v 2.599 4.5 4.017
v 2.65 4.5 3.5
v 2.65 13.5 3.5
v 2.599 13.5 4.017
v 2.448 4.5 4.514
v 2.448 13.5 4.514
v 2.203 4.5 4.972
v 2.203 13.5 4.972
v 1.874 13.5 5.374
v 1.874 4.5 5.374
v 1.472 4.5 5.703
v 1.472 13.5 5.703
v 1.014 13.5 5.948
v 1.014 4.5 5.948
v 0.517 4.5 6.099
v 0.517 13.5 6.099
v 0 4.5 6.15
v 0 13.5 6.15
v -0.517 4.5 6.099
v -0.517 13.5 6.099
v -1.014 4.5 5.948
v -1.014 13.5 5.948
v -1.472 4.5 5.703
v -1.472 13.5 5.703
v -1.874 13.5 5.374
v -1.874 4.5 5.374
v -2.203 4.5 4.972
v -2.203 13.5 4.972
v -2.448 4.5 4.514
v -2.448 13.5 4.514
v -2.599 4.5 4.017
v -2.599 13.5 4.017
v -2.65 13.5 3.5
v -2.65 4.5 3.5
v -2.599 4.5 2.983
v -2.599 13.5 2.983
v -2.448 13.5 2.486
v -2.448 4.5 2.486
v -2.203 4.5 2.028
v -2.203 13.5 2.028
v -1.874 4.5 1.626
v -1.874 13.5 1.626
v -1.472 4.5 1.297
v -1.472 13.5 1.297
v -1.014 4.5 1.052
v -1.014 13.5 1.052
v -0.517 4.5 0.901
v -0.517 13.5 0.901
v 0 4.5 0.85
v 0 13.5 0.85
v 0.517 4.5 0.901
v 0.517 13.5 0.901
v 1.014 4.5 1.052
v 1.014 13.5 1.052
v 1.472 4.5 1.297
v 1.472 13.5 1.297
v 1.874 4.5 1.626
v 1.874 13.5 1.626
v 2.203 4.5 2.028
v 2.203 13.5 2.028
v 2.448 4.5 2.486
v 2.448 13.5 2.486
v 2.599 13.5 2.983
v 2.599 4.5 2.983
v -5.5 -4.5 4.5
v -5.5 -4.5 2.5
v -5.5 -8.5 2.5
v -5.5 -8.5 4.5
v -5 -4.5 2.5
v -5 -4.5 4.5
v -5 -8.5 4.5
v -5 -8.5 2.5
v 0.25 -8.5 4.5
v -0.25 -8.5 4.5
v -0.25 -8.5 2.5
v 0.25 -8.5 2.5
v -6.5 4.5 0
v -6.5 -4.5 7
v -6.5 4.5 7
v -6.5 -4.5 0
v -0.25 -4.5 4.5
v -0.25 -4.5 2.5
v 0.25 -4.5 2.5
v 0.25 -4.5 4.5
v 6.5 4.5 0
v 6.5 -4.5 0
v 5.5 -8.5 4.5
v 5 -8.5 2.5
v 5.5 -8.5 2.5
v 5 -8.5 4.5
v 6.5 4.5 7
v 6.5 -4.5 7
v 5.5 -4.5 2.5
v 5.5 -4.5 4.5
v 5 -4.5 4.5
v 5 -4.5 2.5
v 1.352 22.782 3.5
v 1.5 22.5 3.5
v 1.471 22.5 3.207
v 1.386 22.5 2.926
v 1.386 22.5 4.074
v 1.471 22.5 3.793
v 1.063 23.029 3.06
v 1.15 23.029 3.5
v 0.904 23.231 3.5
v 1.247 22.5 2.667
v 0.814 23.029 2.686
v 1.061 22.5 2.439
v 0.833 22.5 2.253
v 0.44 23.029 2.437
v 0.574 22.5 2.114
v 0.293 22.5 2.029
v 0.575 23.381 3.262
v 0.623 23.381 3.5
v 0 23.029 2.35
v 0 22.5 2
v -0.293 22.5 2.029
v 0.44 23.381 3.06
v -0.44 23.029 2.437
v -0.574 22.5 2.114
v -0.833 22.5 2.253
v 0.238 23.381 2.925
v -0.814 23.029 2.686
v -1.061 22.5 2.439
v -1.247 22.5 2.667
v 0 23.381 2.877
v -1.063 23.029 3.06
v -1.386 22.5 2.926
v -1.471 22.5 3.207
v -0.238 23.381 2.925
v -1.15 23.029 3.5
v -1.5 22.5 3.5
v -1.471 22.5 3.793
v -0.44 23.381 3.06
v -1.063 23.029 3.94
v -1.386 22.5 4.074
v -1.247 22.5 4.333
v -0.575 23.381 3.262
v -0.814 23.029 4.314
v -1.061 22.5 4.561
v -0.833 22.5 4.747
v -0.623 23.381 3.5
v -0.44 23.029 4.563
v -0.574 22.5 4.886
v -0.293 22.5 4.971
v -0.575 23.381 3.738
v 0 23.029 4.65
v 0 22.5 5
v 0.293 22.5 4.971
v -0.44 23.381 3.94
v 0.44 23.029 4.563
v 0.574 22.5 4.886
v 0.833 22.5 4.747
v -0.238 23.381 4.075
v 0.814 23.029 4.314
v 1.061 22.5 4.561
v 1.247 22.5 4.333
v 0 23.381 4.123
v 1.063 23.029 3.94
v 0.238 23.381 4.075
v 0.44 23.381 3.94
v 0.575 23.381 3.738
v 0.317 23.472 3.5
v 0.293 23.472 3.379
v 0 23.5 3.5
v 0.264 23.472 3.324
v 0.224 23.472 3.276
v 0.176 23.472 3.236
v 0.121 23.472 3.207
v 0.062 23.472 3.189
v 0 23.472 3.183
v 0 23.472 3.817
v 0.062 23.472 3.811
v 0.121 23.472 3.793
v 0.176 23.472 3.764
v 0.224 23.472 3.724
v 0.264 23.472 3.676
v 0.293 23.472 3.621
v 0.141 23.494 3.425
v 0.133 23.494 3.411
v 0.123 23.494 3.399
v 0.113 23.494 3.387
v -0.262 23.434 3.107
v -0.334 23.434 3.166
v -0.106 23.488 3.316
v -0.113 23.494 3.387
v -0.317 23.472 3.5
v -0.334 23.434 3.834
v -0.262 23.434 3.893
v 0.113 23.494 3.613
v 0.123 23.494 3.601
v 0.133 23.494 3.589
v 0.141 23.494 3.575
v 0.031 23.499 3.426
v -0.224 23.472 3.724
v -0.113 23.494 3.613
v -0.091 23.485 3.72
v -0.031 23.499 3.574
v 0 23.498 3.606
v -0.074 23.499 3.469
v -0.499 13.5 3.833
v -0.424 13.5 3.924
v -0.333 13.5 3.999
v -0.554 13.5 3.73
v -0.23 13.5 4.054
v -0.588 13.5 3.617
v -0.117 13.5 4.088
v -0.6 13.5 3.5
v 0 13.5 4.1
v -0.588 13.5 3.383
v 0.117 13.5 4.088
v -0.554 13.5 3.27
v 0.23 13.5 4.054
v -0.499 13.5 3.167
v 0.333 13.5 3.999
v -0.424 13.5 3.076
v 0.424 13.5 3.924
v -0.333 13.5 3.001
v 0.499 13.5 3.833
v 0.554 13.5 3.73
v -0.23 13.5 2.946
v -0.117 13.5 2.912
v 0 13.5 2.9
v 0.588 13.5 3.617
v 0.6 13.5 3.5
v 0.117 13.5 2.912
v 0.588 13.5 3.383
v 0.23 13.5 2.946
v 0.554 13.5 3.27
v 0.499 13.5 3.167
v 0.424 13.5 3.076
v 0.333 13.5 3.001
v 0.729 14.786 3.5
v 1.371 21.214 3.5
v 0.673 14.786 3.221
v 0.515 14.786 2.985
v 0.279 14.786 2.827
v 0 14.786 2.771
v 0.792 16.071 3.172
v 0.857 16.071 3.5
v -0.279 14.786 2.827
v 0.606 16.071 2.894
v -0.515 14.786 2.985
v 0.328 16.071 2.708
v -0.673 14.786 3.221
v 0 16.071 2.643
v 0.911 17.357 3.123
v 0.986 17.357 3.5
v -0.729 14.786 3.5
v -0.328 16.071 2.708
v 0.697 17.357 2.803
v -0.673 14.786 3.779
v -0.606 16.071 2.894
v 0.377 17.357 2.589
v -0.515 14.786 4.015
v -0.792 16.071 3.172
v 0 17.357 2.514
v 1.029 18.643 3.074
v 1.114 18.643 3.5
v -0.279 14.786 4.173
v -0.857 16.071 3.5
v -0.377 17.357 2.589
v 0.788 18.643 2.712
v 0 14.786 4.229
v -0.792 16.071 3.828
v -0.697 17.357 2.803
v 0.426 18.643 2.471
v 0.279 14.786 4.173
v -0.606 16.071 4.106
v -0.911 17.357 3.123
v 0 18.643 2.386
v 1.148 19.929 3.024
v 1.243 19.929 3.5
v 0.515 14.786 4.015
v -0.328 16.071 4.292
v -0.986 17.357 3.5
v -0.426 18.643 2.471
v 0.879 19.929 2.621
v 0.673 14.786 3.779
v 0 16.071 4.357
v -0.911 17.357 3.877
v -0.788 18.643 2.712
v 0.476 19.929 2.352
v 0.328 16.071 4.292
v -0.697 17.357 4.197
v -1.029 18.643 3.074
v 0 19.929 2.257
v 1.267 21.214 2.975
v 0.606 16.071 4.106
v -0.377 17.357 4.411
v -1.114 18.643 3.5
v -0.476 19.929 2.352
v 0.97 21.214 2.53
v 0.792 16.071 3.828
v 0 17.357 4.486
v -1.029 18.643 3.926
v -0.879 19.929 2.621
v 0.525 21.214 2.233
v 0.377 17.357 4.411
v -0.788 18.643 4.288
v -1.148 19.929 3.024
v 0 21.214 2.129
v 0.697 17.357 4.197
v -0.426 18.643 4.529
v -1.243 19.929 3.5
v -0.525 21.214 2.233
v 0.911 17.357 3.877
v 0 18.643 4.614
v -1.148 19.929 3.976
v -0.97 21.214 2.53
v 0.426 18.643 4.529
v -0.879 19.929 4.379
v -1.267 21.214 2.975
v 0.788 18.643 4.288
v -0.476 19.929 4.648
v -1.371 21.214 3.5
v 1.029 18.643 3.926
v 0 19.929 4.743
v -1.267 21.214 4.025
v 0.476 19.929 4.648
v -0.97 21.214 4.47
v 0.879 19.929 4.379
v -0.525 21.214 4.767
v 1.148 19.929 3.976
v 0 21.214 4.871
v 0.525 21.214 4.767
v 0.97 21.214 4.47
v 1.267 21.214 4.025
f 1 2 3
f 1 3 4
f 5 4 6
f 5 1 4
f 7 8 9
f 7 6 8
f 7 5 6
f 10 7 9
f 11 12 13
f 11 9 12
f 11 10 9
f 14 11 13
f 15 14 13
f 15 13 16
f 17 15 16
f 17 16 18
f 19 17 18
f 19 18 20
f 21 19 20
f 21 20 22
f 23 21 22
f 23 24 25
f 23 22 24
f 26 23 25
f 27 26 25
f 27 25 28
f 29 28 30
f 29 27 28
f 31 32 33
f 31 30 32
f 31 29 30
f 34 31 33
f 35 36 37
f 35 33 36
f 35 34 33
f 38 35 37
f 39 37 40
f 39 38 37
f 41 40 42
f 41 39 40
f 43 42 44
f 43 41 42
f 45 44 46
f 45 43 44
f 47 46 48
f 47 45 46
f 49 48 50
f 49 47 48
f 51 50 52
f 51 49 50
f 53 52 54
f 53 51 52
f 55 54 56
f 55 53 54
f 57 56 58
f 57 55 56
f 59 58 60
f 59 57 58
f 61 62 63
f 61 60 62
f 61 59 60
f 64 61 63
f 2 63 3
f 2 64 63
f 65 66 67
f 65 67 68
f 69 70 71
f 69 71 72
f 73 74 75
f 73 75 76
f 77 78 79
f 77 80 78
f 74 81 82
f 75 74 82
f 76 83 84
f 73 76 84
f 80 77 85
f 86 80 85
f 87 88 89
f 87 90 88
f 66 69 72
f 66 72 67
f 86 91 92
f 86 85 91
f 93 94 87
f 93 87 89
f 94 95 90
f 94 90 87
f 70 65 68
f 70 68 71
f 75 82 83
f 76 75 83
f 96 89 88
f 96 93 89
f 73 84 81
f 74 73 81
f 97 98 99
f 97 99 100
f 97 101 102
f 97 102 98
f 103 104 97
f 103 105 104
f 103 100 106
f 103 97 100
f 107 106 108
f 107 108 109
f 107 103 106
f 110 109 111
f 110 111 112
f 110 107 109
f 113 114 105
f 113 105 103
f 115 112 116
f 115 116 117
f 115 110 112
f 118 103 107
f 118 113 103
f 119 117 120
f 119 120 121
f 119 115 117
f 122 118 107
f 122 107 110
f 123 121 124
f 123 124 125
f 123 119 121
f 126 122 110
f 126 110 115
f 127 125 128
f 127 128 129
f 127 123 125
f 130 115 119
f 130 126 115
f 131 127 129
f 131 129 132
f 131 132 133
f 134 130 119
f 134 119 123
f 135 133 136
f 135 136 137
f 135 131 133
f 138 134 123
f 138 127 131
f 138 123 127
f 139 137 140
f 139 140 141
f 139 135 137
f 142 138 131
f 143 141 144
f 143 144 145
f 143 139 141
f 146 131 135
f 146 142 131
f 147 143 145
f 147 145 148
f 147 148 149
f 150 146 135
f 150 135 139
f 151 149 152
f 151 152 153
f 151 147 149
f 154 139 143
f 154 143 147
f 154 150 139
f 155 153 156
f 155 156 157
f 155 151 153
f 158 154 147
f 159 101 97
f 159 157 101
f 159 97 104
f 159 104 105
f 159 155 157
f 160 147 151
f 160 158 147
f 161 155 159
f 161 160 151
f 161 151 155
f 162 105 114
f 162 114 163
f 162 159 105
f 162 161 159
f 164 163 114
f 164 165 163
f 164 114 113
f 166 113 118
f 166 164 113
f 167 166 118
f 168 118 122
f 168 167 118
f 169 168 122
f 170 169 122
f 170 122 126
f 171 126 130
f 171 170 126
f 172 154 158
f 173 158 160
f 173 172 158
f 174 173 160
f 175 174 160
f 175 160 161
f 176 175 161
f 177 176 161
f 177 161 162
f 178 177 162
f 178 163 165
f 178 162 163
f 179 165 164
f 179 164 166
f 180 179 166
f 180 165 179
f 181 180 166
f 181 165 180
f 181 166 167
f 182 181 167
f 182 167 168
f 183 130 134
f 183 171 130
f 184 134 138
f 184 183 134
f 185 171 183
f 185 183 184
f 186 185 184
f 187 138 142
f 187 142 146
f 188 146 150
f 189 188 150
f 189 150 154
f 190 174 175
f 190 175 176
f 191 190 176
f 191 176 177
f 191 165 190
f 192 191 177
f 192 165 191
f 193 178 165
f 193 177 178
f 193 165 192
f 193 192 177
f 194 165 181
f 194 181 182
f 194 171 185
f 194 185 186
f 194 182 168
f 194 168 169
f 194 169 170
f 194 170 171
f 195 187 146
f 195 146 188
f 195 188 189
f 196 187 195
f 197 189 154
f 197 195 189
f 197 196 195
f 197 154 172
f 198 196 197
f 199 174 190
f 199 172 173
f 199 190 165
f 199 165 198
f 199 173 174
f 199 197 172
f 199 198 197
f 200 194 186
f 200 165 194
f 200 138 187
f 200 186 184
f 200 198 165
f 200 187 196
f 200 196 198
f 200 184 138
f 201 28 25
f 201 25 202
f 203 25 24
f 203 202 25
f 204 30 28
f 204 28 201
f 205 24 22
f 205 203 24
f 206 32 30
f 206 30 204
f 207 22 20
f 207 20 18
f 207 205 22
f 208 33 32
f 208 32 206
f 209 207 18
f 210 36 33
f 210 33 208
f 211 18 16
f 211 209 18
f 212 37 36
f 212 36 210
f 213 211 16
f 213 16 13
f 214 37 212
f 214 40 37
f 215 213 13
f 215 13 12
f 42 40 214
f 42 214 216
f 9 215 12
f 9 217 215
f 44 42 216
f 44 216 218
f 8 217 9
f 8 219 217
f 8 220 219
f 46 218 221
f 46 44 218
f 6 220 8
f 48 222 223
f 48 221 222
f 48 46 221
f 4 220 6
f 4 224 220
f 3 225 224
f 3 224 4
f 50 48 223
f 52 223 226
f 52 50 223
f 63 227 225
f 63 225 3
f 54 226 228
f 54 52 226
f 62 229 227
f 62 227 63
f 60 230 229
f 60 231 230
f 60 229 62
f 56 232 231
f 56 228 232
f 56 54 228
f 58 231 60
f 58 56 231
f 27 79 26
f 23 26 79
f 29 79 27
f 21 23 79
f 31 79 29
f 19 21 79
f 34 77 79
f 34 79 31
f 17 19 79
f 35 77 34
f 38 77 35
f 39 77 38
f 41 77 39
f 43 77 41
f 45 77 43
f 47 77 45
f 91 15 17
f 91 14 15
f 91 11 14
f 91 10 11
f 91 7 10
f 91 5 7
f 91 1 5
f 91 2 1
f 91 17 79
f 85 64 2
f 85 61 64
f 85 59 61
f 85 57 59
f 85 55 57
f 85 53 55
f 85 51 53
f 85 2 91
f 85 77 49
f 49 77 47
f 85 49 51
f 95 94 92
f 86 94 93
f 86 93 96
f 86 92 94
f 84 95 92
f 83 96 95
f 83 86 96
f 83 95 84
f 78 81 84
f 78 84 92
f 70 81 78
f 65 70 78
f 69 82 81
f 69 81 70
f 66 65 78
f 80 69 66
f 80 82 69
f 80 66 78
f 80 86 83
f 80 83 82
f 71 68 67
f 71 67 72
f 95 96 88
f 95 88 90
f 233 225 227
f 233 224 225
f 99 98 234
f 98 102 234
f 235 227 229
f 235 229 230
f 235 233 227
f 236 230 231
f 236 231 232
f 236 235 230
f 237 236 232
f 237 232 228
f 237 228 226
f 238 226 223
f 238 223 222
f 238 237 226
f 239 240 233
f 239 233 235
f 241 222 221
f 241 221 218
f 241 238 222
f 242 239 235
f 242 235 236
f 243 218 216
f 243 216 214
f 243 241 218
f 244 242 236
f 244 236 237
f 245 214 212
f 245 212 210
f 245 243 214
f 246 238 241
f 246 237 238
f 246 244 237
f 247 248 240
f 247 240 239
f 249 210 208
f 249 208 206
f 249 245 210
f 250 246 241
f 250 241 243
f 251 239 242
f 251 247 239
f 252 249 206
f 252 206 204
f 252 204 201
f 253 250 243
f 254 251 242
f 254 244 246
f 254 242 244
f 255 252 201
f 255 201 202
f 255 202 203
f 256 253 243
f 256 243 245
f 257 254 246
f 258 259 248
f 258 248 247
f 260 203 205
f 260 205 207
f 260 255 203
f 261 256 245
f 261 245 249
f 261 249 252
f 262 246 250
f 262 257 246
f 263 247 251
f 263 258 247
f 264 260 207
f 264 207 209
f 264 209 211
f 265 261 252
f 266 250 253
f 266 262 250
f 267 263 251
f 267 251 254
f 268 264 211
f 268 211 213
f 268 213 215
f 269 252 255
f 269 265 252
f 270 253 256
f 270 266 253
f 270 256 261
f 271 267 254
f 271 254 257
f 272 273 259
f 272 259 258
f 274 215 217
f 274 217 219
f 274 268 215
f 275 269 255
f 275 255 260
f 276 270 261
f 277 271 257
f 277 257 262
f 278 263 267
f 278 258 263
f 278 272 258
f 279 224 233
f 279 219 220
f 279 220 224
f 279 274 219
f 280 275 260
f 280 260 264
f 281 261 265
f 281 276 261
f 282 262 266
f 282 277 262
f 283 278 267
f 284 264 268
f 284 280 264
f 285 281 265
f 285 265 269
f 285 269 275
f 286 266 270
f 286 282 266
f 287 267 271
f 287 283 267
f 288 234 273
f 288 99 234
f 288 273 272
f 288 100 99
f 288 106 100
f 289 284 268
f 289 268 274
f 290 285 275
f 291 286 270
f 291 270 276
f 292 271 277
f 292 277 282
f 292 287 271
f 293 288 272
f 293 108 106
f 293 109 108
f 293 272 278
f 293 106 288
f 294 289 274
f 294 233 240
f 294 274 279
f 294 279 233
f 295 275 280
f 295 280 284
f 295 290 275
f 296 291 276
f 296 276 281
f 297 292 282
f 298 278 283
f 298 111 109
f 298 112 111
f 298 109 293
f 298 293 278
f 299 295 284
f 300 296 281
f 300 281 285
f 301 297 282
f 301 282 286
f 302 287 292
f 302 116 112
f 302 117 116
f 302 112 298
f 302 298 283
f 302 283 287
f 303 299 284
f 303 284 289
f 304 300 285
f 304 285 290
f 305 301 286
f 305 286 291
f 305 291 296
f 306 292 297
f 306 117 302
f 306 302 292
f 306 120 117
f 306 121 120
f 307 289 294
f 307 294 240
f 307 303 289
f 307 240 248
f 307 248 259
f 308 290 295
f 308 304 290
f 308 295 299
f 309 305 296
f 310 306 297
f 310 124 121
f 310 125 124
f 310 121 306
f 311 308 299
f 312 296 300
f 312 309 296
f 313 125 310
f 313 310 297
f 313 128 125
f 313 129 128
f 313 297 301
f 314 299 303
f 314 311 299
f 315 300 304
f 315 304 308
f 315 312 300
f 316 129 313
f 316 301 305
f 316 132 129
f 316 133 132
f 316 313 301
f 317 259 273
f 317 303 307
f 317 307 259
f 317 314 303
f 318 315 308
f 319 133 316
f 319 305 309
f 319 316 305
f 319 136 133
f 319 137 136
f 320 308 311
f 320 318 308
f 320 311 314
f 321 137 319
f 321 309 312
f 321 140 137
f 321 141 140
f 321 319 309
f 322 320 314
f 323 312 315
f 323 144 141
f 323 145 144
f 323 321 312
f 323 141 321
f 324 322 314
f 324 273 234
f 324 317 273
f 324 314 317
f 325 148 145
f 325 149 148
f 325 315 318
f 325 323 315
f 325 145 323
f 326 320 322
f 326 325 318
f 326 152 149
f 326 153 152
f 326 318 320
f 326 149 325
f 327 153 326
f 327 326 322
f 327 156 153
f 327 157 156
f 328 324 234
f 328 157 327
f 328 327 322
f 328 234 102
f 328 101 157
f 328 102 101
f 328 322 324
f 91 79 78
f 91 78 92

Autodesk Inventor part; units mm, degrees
ref_plane "YZ Plane" through (0, 0, 0) normal (1, 0, 0) x (0, 1, 0)
ref_plane "XZ Plane" through (0, 0, 0) normal (0, 1, 0) x (-1, 0, 0)
ref_plane "XY Plane" through (0, 0, 0) normal (0, 0, 1) x (1, 0, 0)
sketch "Sketch1" plane through (0, 0, 0) normal (0, 0, 1) x (1, 0, 0)
  line L0 (-6.5, 4.5) -> (6.5, 4.5)
  line L1 (6.5, 4.5) -> (6.5, -4.5)
  line L2 (6.5, -4.5) -> (-6.5, -4.5)
  line L3 (-6.5, -4.5) -> (-6.5, 4.5)
  point P0 (0, 0)
  dimension "d0" = 13
  dimension "d1" = 9
  dimension "d2" = 4.5
  dimension "d3" = 6.5
extrude "Extrusion1" add sketch "Sketch1" along normal blind 7
sketch "Sketch2" plane through (-6.5, -4.5, 0) normal (0, -1, 0) x (1, 0, 0)
  line L0 (1, 4.5) -> (1.5, 4.5)
  line L1 (1.5, 4.5) -> (1.5, 2.5)
  line L2 (1.5, 2.5) -> (1, 2.5)
  line L3 (1, 2.5) -> (1, 4.5)
  line L4 (11.5, 4.5) -> (12, 4.5)
  line L5 (12, 4.5) -> (12, 2.5)
  line L6 (12, 2.5) -> (11.5, 2.5)
  line L7 (11.5, 2.5) -> (11.5, 4.5)
  line L8 (6.25, 2.5) -> (6.75, 2.5)
  line L9 (6.75, 2.5) -> (6.75, 4.5)
  line L10 (6.75, 4.5) -> (6.25, 4.5)
  line L11 (6.25, 4.5) -> (6.25, 2.5)
  line L12 (0, 0) -> (0, 7) projected
  line L13 (13, 0) -> (13, 7) projected
  line L14 (0, 7) -> (13, 7) projected
  point P0 (6.5, 0)
  dimension "d6" = 0.5
  dimension "d7" = 0.5
  dimension "d8" = 0.5
  dimension "d9" = 1
  dimension "d10" = 1
  dimension "d11" = 6.25
  dimension "d12" = 6.25
  dimension "d13" = 2
  dimension "d14" = 2
  dimension "d15" = 2
  dimension "d16" = 2.5
extrude "Extrusion2" add sketch "Sketch2" along normal blind 4
sketch "Sketch3" plane through (-6.5, 4.5, 0) normal (0, 1, 0) x (1, 0, 0)
  line L0 (0, -7) -> (13, -7) projected
  line L1 (0, 0) -> (0, -7) projected
  circle A0 centre (6.5, -3.5) radius 2.65
  point P0 (6.5, 0)
  point P1 (6.5, -7)
  point P2 (0, -3.5)
  dimension "d19" = 5.3
extrude "Extrusion3" add sketch "Sketch3" along normal blind 9
sketch "Sketch4" plane through (0, 13.5, 3.5) normal (0, 1, 0) x (1, 0, 0)
  line L0 (-0.5, 0) -> (0.5, 0)
  line L1 (0.5, 0) -> (0.5, 0.1)
  line L2 (0.5, 0.1) -> (-0.5, 0.1)
  line L3 (-0.5, 0.1) -> (-0.5, 0)
  circle A0 centre (0, 0) radius 2.65 projected
  point P0 (0, 3.5)
  dimension "d22" = 0
  dimension "d23" = 0.1
  dimension "d24" = 0.5
  dimension "d25" = 0.5
extrude "Extrusion4" add sketch "Sketch4" along normal blind 3 contours L3 L2 L1 L0
sketch "Sketch5" plane through (-0.5, 13.5, 3.5) normal (0, 0, 1) x (1, 0, 0)
  line L0 (3.15, 0) -> (-2.15, 0) projected
  line L1 (0, 0) -> (0, 3) projected
  line L2 (1.1, 0) -> (2, 9)
  arc A0 (2, 9) -> (0.5, 10) centre (0.5167, 8.4001) ccw
  line L3 (0.5, 10) -> (0.5, 0)
  line L4 (1.1, 0) -> (0.5, 0)
  line L5 (0.5, -28.4463) -> (0.5, 16.6776) projected
  point P0 (0.5, -13.5)
  point P1 (2, 10)
  dimension "d28" = 10
  dimension "d29" = 1.5
  dimension "d30" = 1.1
  dimension "d31" = 1
  dimension "d32" = 1.6
revolve "Revolution1" add sketch "Sketch5" angle 360 about axis through (0, -10, 3.5) along (0, 1, 0)
thread "Thread1" size "M5.5x0.5" class "6g" standard "ANSI Metric M Profile" full length
properties part number "switch-mockup"
